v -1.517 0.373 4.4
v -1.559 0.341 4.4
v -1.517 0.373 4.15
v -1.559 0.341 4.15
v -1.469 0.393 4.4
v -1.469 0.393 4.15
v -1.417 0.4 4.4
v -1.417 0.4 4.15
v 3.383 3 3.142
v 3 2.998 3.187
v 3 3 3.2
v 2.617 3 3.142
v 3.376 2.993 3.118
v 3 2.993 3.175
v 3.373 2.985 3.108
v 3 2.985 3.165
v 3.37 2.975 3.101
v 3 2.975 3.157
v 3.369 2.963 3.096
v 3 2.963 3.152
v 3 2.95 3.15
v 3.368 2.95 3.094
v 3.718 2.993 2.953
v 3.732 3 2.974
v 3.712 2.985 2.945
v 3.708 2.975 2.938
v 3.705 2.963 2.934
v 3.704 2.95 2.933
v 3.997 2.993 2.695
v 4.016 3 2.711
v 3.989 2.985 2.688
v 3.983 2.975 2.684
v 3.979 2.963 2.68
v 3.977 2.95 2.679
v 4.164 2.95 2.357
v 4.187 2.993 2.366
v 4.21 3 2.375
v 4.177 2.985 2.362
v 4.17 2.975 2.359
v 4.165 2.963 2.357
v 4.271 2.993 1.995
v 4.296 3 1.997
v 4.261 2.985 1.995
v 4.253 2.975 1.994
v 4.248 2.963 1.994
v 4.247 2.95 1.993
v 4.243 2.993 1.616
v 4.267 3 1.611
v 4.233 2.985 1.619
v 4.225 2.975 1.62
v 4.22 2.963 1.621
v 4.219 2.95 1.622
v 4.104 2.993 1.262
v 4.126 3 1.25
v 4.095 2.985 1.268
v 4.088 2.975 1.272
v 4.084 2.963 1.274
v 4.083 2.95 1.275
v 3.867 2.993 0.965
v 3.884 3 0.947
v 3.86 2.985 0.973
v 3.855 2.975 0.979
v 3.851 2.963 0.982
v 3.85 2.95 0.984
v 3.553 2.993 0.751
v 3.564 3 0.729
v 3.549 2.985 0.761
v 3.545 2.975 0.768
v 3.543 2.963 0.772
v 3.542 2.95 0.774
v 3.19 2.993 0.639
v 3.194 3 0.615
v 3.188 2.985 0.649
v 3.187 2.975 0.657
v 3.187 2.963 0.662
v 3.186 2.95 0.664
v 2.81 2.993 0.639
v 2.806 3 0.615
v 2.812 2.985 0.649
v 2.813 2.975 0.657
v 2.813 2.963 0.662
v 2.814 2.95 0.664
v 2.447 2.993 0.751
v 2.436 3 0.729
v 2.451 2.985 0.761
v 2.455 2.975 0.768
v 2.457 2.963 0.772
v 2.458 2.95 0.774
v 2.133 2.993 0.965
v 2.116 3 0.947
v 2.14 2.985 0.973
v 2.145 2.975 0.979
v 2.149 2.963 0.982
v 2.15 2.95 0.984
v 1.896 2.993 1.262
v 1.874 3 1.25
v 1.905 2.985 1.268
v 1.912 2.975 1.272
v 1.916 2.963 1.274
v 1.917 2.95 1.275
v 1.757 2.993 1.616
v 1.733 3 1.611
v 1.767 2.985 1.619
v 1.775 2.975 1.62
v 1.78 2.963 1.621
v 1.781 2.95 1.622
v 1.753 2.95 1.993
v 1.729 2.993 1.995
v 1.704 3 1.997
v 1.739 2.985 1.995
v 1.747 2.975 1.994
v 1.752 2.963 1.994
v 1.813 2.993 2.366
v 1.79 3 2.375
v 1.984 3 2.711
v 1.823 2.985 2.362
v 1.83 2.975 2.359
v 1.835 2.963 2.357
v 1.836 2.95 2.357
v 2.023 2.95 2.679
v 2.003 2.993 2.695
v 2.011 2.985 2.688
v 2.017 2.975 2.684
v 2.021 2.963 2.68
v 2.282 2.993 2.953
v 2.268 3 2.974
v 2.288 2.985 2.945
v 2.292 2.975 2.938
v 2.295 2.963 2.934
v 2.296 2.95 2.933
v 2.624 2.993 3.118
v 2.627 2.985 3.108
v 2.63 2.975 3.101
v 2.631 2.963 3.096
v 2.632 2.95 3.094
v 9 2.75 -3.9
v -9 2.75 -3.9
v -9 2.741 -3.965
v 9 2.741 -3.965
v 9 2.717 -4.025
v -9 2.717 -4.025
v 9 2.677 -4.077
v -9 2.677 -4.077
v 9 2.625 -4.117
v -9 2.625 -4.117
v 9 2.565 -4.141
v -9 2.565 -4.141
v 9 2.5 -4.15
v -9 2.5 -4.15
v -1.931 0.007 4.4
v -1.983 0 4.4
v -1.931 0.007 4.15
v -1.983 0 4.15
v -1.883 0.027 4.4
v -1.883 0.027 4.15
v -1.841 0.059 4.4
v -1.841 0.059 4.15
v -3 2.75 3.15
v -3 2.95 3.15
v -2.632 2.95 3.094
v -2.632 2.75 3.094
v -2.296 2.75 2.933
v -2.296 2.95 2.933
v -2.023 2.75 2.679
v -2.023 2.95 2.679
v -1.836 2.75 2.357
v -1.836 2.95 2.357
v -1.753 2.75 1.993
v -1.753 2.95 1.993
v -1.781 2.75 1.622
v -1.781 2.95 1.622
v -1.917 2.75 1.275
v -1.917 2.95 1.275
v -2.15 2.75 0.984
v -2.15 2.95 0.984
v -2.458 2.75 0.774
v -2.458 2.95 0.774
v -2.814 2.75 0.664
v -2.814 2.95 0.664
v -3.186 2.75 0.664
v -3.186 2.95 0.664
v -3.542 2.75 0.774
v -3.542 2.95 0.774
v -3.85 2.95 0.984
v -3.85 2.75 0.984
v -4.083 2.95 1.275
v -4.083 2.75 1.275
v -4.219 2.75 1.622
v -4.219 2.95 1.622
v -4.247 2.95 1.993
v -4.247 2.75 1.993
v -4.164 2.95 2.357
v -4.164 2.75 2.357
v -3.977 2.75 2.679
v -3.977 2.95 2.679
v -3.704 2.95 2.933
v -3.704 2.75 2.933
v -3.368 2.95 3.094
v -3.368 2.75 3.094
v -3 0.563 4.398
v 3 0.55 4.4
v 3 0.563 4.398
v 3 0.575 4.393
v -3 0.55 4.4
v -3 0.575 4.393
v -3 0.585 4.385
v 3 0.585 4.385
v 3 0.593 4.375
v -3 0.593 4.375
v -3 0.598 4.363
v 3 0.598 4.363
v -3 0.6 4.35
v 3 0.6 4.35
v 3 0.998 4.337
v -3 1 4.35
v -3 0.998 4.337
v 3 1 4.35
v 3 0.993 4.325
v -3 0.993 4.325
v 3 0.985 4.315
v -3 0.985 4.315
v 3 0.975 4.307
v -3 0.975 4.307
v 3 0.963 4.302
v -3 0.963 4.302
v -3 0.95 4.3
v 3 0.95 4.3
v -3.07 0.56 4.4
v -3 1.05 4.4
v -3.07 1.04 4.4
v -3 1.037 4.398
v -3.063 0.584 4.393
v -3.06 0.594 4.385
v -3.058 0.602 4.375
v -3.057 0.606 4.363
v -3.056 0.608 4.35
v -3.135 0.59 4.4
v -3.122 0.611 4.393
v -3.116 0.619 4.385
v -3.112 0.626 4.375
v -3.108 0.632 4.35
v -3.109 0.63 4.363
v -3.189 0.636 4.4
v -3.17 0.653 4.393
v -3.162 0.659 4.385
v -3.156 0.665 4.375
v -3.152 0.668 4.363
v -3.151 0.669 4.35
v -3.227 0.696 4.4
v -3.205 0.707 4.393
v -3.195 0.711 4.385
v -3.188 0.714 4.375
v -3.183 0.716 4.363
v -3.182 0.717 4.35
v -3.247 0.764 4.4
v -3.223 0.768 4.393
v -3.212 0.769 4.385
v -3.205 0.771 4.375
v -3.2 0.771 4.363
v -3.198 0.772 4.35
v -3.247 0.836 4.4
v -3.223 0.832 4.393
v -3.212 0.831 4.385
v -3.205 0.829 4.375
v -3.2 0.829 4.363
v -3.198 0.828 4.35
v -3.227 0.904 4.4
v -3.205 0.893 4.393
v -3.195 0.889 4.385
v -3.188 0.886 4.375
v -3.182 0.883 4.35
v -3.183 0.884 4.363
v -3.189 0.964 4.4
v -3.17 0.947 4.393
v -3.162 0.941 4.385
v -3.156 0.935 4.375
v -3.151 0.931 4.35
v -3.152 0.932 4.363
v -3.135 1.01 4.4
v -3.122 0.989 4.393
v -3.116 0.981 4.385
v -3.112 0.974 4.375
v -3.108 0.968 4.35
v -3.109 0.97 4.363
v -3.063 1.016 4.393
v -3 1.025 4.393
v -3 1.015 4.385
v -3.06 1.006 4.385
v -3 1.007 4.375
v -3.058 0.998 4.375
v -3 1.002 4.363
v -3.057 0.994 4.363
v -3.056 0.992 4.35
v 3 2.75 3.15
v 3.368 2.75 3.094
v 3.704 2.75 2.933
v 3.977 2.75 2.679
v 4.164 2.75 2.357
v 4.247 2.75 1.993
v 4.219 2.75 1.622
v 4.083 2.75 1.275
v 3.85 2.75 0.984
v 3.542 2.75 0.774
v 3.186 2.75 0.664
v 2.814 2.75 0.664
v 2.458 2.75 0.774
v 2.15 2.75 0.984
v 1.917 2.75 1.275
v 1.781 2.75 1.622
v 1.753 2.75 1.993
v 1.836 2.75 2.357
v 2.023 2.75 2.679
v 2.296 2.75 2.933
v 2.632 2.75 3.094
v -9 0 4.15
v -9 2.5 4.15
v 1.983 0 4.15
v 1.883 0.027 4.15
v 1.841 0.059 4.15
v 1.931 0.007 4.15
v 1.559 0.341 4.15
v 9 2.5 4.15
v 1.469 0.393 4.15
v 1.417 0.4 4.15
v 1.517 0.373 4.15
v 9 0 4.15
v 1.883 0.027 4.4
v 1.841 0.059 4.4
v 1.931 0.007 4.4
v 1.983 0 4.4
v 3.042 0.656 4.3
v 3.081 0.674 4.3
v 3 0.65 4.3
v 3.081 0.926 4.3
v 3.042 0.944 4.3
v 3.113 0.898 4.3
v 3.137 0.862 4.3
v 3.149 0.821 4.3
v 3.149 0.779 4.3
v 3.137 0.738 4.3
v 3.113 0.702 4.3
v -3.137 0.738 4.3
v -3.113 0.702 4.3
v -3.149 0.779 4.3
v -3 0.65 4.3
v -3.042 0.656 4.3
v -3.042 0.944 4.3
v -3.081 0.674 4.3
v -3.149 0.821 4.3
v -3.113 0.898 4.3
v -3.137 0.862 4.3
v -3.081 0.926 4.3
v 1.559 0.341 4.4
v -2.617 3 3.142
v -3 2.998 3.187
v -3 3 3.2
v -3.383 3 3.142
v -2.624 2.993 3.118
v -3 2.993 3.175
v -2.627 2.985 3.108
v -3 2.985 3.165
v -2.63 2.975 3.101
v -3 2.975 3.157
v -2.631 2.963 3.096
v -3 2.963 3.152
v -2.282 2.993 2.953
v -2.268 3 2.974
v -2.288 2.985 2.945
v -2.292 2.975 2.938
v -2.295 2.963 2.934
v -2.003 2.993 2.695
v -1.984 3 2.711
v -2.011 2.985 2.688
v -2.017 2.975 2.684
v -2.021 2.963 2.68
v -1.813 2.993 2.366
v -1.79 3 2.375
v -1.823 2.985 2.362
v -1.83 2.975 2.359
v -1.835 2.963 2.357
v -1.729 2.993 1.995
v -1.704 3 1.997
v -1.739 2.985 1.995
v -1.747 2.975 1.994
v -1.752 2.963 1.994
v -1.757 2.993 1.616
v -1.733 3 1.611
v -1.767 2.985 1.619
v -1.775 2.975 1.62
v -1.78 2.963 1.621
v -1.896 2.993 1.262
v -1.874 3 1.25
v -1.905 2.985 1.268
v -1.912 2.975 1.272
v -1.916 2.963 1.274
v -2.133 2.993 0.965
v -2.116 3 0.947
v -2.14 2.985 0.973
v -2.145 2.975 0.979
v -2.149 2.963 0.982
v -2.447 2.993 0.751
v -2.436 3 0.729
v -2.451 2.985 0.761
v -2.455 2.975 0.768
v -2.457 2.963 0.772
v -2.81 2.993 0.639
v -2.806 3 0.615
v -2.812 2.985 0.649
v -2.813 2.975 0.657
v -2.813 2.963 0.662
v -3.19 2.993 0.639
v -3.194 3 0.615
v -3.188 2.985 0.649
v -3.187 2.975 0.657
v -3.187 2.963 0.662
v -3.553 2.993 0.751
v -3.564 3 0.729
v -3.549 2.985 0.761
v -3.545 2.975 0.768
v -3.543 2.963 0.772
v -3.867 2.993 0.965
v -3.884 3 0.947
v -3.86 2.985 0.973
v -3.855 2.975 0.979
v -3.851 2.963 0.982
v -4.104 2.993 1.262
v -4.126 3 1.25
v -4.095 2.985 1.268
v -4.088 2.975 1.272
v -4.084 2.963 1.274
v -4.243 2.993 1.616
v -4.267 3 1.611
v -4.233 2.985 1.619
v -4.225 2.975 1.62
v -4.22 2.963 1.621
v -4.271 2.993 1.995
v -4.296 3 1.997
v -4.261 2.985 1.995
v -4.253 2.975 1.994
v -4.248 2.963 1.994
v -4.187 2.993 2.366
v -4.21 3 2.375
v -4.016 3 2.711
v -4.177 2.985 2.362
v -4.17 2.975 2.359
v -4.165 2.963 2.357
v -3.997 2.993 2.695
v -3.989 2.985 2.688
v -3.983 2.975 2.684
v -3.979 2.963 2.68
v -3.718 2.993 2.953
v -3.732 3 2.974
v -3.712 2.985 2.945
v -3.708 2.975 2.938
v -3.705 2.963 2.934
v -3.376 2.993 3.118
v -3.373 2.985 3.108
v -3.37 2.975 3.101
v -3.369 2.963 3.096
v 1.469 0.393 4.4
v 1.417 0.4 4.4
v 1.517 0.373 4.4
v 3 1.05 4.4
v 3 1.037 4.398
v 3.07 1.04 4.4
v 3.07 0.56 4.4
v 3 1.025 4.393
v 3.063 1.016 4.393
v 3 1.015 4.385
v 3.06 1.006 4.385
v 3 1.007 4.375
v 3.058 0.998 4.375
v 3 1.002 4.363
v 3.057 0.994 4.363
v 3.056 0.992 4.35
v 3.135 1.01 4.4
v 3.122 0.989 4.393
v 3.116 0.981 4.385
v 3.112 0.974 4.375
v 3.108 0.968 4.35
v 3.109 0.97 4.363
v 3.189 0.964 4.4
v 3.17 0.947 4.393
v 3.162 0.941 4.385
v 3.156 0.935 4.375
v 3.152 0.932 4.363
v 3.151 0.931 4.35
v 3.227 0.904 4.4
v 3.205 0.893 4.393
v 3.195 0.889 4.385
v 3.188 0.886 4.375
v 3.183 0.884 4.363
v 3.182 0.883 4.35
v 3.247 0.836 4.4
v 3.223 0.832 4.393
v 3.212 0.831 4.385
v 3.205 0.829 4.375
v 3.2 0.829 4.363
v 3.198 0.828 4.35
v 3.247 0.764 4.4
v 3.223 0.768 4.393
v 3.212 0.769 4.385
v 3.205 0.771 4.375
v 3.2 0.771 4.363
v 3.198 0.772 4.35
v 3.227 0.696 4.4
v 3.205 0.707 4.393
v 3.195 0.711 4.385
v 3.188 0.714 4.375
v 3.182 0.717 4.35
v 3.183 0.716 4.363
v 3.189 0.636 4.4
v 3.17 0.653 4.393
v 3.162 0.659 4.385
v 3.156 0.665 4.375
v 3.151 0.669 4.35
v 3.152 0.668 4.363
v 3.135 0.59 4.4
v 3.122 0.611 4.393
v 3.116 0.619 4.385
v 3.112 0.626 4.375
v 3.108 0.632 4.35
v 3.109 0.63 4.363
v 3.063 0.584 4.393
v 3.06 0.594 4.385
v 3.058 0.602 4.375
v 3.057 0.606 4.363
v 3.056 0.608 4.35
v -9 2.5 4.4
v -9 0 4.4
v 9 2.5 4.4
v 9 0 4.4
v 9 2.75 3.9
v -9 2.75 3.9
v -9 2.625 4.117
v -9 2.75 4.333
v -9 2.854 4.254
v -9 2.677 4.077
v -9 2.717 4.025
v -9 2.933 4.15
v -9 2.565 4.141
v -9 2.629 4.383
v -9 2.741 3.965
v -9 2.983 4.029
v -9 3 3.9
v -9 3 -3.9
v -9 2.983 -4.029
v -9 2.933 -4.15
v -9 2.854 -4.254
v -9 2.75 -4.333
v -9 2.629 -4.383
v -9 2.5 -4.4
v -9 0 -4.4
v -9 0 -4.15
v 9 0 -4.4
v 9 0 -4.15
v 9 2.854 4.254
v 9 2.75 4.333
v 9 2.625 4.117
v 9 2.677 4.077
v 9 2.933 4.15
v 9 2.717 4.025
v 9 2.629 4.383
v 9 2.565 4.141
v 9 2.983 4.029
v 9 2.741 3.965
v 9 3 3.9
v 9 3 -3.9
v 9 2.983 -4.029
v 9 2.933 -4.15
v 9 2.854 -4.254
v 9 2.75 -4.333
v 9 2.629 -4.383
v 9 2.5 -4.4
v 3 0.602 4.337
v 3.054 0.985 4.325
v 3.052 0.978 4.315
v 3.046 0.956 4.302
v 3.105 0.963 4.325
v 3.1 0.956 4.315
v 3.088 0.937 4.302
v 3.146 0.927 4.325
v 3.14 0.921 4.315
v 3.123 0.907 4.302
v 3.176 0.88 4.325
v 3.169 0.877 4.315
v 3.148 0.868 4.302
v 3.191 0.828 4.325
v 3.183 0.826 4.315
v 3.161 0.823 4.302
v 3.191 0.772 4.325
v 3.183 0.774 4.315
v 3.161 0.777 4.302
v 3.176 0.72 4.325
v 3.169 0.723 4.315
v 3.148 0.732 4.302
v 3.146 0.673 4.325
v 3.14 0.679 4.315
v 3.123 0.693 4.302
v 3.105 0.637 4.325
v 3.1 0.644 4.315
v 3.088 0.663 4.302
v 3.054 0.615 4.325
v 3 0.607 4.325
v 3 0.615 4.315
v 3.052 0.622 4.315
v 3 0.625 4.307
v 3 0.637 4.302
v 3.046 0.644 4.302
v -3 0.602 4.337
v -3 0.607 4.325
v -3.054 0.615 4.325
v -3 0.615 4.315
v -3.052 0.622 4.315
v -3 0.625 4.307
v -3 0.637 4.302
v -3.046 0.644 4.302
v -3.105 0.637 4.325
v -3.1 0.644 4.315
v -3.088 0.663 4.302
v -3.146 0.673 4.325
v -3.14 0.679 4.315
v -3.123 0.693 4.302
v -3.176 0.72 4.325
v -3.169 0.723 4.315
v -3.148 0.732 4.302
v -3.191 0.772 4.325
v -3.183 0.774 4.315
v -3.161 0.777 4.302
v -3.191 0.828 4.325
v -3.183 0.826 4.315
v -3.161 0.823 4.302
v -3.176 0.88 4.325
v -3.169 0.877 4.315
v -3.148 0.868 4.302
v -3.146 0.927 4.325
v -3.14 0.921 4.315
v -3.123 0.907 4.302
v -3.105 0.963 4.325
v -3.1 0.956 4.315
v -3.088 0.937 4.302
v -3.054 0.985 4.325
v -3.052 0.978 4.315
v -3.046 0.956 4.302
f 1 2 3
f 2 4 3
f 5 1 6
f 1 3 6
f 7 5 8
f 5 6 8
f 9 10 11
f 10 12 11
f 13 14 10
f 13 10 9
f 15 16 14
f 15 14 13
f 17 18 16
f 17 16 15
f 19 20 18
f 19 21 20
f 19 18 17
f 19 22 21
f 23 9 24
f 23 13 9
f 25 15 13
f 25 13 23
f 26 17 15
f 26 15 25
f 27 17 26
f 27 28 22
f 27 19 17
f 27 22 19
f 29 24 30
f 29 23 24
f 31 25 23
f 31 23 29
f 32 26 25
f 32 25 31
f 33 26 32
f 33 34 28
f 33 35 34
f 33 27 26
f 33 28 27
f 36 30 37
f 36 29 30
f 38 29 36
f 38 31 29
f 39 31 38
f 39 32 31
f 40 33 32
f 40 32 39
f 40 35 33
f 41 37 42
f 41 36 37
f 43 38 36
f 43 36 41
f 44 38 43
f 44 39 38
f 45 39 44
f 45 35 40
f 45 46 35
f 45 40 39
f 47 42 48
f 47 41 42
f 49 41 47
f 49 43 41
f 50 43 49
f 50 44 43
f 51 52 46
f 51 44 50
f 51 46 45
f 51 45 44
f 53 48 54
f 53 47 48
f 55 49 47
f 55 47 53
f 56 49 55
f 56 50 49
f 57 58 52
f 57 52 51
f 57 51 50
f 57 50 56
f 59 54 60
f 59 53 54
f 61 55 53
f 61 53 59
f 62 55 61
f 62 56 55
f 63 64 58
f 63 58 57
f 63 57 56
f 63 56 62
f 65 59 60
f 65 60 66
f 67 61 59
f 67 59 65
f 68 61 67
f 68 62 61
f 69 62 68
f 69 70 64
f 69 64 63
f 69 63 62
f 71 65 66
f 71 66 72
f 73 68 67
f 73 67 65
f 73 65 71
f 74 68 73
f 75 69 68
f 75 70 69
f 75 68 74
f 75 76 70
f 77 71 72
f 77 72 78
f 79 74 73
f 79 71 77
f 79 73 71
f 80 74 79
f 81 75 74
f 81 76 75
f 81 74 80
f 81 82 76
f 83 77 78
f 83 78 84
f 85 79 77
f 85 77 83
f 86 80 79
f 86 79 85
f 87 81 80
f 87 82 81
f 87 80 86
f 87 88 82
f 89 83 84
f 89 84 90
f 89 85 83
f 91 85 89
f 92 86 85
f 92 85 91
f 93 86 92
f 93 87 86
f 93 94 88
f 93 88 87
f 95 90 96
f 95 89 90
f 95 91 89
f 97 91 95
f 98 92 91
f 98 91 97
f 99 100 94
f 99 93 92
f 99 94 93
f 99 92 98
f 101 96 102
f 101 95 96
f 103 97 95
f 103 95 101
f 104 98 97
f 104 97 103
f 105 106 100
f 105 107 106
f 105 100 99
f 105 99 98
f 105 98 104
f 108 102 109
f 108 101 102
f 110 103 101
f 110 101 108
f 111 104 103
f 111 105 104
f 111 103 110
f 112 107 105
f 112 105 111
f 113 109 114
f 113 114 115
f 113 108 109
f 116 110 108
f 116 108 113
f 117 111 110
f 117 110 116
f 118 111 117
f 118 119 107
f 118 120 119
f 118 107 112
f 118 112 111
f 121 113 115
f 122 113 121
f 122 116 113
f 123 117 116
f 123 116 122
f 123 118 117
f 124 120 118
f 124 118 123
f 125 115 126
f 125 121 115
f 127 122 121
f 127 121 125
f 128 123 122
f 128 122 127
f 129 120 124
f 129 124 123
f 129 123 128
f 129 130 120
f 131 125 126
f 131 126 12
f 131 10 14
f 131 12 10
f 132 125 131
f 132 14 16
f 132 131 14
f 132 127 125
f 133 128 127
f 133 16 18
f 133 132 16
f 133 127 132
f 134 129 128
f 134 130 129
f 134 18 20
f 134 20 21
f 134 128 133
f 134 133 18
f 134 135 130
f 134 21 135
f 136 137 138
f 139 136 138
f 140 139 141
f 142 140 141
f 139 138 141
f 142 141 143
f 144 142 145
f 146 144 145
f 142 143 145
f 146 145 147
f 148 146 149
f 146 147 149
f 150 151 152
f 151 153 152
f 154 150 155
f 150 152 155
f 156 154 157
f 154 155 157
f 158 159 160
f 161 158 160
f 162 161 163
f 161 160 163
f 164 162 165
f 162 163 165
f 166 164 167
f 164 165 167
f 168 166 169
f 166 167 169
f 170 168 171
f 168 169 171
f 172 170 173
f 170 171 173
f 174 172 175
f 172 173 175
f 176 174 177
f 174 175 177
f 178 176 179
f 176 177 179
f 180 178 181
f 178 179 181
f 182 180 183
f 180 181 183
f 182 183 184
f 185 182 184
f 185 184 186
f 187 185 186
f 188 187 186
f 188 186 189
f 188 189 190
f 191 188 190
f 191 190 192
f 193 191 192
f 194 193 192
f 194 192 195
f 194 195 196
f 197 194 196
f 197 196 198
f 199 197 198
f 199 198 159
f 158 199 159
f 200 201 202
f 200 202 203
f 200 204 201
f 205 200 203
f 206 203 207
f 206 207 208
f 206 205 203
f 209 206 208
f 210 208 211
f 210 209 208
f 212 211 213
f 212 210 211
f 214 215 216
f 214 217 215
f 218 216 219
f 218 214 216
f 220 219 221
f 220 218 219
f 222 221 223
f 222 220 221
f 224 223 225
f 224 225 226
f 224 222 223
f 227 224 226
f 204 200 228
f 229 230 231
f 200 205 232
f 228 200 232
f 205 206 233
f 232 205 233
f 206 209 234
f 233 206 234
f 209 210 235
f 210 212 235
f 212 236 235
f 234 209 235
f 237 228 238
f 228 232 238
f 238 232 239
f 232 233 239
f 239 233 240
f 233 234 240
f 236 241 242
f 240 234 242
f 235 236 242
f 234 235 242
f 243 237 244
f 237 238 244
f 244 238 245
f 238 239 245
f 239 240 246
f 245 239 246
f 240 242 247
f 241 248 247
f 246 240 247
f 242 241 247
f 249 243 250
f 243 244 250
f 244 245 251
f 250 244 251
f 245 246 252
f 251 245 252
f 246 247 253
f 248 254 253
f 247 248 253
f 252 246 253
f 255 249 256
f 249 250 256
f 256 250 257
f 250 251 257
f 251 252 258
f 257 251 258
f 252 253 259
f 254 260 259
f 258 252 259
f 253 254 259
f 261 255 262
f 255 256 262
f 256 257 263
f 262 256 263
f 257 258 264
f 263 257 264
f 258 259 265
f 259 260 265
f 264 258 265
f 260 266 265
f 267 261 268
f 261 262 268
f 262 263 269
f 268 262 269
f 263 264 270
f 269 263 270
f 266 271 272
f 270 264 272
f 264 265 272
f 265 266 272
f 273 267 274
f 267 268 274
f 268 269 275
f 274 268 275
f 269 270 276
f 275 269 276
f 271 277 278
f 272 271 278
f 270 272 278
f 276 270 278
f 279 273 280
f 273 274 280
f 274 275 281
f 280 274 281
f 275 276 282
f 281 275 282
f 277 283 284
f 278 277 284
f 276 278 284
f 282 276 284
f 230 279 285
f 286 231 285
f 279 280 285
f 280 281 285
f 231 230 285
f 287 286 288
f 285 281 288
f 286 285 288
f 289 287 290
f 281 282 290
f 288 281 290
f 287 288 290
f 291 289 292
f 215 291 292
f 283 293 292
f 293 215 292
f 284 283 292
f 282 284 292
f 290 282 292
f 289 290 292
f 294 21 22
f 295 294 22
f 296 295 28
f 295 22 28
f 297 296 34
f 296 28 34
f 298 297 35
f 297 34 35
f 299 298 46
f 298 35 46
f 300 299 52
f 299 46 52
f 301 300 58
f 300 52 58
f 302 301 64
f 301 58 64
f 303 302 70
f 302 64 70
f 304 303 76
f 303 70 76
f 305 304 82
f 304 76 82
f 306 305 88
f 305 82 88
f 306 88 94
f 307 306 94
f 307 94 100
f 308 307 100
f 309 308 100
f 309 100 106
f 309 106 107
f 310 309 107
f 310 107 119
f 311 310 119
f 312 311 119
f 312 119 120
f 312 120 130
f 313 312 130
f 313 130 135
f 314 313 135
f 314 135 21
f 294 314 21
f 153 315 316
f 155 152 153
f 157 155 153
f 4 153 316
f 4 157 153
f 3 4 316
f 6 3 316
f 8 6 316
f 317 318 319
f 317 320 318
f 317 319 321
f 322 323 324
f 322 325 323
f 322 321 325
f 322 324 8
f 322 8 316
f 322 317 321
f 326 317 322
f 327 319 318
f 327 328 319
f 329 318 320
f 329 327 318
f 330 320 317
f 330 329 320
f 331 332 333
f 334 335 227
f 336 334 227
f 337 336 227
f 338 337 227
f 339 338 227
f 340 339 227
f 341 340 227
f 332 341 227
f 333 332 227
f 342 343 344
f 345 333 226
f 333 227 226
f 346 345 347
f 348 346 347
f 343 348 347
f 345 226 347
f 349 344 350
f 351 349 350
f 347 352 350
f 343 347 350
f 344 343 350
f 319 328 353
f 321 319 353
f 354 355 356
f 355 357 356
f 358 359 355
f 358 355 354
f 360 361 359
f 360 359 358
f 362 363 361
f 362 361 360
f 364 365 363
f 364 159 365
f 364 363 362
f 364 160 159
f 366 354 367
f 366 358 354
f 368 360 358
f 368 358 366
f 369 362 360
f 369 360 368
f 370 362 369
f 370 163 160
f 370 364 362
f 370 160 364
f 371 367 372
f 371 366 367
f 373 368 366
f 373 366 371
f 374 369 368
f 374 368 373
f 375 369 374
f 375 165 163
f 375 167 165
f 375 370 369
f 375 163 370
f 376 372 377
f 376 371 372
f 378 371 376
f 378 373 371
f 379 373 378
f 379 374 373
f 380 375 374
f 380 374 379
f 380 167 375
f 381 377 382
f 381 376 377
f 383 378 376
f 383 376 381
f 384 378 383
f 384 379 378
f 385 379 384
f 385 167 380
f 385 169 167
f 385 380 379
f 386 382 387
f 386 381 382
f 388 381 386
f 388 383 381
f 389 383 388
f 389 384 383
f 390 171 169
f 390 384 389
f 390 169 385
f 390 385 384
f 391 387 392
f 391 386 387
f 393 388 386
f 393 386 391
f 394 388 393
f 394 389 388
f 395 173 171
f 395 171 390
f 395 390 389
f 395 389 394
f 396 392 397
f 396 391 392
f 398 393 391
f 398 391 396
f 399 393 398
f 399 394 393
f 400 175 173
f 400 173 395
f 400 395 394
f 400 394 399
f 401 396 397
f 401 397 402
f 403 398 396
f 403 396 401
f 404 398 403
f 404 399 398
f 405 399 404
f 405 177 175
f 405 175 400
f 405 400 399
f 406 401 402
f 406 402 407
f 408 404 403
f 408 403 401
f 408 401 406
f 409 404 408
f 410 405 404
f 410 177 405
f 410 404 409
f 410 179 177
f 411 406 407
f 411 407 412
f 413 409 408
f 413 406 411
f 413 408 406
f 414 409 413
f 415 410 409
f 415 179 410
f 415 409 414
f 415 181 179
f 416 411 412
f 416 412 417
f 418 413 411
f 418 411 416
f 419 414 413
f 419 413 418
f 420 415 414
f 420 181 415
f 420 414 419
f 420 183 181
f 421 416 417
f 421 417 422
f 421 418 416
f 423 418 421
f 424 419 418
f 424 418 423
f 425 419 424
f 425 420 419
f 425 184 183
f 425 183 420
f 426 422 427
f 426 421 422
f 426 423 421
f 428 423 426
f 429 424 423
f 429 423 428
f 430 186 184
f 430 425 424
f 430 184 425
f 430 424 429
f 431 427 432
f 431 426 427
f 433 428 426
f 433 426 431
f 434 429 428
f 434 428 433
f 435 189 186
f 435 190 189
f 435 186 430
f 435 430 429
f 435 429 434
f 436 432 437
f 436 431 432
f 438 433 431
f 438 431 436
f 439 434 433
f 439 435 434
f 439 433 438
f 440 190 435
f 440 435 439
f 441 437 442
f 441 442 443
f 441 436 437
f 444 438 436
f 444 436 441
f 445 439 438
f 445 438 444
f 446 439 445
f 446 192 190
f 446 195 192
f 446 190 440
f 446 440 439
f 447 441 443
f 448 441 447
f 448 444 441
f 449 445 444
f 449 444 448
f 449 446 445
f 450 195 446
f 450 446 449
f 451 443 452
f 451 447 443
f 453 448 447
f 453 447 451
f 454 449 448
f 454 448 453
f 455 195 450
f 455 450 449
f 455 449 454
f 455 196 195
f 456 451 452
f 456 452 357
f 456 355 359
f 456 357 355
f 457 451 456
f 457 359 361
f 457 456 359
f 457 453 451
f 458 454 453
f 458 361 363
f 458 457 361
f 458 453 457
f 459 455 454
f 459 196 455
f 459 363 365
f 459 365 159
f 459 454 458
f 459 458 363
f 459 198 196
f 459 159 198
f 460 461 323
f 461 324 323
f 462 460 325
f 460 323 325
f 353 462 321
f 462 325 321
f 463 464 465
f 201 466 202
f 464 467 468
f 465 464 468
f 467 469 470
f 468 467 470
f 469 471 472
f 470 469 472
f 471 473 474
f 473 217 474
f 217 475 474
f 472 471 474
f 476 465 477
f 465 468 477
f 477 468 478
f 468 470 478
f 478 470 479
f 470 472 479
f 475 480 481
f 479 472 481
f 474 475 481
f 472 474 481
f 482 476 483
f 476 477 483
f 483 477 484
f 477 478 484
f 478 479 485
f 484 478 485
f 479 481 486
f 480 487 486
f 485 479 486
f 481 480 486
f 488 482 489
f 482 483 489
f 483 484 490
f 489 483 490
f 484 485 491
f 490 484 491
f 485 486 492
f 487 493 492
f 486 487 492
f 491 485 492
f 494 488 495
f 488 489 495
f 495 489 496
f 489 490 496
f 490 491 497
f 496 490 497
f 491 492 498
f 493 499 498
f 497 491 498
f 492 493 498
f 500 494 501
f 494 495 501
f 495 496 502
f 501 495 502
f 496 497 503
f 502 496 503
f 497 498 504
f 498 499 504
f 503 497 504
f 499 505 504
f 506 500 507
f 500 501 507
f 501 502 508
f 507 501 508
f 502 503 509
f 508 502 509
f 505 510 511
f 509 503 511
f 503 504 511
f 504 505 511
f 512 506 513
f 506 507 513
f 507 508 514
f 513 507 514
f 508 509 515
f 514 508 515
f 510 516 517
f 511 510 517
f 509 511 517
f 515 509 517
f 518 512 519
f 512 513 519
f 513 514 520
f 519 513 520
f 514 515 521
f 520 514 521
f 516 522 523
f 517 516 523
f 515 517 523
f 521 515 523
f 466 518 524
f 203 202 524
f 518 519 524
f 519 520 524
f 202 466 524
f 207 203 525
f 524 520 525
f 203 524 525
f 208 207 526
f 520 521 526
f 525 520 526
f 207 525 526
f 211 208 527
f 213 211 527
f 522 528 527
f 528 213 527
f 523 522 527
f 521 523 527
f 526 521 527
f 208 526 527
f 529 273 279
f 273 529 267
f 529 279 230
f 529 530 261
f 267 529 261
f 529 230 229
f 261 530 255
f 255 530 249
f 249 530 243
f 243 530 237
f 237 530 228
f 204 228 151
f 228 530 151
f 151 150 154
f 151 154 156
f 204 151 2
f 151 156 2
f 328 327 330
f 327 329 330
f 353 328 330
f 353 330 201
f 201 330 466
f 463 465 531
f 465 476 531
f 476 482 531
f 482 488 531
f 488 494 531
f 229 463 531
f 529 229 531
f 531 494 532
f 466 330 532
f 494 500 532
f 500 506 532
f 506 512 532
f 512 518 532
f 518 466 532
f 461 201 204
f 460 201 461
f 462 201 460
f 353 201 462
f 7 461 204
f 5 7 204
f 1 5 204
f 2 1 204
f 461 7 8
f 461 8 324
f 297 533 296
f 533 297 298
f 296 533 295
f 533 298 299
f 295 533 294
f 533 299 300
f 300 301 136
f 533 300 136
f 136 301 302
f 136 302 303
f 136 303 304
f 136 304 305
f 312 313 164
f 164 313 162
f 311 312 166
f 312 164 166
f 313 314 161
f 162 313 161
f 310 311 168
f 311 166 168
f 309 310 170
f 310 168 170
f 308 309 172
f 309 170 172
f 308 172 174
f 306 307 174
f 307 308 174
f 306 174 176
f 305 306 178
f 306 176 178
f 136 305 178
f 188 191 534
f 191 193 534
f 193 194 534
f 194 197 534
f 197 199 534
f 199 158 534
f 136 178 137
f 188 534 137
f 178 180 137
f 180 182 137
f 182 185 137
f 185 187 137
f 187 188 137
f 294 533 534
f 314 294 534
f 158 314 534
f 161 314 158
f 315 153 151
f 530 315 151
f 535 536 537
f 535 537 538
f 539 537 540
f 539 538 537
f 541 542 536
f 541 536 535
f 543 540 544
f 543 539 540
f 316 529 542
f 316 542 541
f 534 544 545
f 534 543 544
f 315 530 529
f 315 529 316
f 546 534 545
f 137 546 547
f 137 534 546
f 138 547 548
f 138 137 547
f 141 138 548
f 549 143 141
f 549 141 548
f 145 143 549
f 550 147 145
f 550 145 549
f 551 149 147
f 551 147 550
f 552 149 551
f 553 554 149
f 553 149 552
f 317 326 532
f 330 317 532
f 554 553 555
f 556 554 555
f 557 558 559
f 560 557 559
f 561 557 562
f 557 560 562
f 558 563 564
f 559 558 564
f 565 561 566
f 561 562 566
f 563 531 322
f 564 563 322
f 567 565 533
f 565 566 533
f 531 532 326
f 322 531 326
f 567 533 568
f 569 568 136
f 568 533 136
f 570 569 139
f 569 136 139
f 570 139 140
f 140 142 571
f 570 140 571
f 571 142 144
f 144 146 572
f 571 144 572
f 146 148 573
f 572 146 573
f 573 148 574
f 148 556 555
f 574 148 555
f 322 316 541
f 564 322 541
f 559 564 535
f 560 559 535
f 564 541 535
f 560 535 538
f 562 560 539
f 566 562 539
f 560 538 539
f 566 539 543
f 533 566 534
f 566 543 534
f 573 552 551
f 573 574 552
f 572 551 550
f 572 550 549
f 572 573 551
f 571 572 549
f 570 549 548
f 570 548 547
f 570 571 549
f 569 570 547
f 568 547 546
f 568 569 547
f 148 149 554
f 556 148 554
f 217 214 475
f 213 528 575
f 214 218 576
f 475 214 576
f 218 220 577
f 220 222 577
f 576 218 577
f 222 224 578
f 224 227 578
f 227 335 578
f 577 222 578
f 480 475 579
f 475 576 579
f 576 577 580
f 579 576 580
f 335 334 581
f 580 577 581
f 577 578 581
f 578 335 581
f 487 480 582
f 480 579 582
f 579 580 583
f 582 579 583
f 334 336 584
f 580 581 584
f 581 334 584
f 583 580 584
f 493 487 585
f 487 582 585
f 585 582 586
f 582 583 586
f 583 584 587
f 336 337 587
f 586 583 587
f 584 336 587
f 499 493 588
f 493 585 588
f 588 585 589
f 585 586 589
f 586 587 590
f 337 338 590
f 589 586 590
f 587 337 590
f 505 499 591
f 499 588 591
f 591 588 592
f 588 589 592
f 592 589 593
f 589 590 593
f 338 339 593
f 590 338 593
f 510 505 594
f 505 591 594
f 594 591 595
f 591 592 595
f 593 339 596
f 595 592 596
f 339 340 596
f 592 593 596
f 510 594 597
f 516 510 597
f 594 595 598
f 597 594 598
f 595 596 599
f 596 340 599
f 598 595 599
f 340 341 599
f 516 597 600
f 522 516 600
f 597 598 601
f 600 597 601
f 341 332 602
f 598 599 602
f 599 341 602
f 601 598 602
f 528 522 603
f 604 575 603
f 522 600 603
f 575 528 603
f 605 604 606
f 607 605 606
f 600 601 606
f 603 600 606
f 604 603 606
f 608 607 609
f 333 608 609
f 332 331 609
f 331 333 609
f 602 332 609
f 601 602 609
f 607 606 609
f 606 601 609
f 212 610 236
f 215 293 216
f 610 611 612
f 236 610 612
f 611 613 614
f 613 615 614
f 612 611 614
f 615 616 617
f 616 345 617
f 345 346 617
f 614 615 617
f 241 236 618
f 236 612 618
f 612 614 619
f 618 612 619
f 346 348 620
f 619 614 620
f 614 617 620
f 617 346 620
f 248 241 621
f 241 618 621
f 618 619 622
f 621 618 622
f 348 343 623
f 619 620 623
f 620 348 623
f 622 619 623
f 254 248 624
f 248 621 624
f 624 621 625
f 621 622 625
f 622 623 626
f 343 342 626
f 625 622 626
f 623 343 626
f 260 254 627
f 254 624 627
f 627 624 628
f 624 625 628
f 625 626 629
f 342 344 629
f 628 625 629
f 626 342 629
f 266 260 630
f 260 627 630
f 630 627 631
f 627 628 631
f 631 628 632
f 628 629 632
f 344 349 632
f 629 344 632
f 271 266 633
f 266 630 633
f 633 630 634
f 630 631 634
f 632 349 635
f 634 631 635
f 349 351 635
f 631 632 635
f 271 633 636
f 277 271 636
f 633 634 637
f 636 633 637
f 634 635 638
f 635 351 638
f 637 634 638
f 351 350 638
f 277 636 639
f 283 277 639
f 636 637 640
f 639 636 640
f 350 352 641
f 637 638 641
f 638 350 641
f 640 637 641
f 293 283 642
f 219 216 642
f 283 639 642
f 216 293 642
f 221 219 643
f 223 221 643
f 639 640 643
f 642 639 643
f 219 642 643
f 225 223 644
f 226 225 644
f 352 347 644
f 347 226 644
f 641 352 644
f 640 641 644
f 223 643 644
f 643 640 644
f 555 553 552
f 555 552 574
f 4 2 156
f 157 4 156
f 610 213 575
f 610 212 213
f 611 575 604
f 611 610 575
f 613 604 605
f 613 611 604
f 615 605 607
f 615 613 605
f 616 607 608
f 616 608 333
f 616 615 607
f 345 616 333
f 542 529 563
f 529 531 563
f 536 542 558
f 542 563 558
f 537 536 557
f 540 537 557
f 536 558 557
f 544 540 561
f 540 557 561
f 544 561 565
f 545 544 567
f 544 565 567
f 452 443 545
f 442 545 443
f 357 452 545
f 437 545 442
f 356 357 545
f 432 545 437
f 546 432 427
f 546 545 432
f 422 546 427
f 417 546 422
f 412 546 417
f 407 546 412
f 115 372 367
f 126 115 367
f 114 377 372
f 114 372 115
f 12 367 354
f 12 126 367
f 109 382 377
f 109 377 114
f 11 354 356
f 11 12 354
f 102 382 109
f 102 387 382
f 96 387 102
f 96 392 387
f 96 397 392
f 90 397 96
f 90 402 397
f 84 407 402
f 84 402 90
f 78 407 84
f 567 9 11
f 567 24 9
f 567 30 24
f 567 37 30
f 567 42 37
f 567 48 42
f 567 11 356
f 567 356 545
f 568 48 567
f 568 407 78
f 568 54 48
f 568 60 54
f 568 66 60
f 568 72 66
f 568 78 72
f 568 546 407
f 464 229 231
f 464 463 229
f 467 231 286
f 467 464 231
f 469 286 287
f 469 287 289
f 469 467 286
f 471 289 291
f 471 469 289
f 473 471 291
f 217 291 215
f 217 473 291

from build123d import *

# Parameters (mm, degrees)
SKETCH1_W           = 18
SKETCH1_H           = 8.8
BOSS_EXTRUDE1_DEPTH = 3
SKETCH2_R           = 1.25
CUT_EXTRUDE1_DEPTH  = 3
FILLET1_R           = 0.5
CUT_EXTRUDE2_DEPTH  = 23
SKETCH4_W           = 4
SKETCH4_H           = 1.424515237
CUT_EXTRUDE3_DEPTH  = 2
CHAMFER1_SIZE       = 0.5
CUT_EXTRUDE4_DEPTH  = 0.1
FILLET2_R           = 0.05
FILLET3_R           = 0.2
FILLET4_R           = 0.05


# Some blends are built 0.0001 mm under size
with BuildPart() as part:
    # Sketch1 → Boss-Extrude1 (new body)
    with BuildSketch(Plane(origin=(0, 0, 0), x_dir=(1, 0, 0), z_dir=(0, 1, 0))):
        Rectangle(SKETCH1_W, SKETCH1_H)
    extrude(amount=BOSS_EXTRUDE1_DEPTH)

    # Sketch2 → Cut-Extrude1 (cut)
    with BuildSketch(Plane(origin=(0, 3, 0), x_dir=(1, 0, 0), z_dir=(0, 1, 0))):
        with Locations(Location((-3, -1.9, 0), (0, 0, 270))):
            Circle(SKETCH2_R)
        with Locations(Location((3, -1.9, 0), (0, 0, 270))):
            Circle(SKETCH2_R)
    extrude(amount=-CUT_EXTRUDE1_DEPTH, mode=Mode.SUBTRACT)

    # Fillet1
    fillet1_edges = [part.edges().sort_by_distance(p)[0] for p in [
        (0, 3, -4.4),
        (0, 3, 4.4),
    ]]
    fillet(fillet1_edges, radius=FILLET1_R)

    # Sketch3 → Cut-Extrude2 (cut)
    with BuildSketch(Plane.ZY.offset(9)):
        with BuildLine():
            Line((-4.15, 0.25), (-4.15, -7.258391717))
            Line((-4.15, -7.258391717), (4.15, -7.258391717))
            Line((4.15, -7.258391717), (4.15, 0.25))
            Line((4.15, 0.25), (4.15, 2.5))
            ThreePointArc((4.15, 2.5), (4.076776695, 2.676776695), (3.9, 2.75))
            Line((3.9, 2.75), (-3.9, 2.75))
            ThreePointArc((-3.9, 2.75), (-4.076776695, 2.676776695), (-4.15, 2.5))
            Line((-4.15, 2.5), (-4.15, 0.25))
        make_face()
    extrude(amount=-CUT_EXTRUDE2_DEPTH, mode=Mode.SUBTRACT)

    # Sketch4 → Cut-Extrude3 (cut)
    with BuildSketch(Plane.XY.offset(4.4)):
        with Locations((0, -0.312257619)):
            Rectangle(SKETCH4_W, SKETCH4_H)
    extrude(amount=-CUT_EXTRUDE3_DEPTH, mode=Mode.SUBTRACT)

    # Chamfer1
    # the kernel refuses this chamfer: 0.5 mm, written as the material it adds along each edge
    with BuildSketch(Plane(origin=(2, 0.4, 4.4), x_dir=(0.027495876610586487, -0.9996219169112968, 0), z_dir=(0, 0, -1))) as chamfer1_piece_1_section:
        Polygon((CHAMFER1_SIZE * 0.999621916911, CHAMFER1_SIZE * 0.0274958766106), (-CHAMFER1_SIZE * 0.0274958766106, CHAMFER1_SIZE * 0.999621916911), (0, 0), align=None)
    chamfer1_piece_1 = extrude(amount=0.25, mode=Mode.PRIVATE)
    chamfer1_piece_1 = split(chamfer1_piece_1, bisect_by=Plane(origin=(1.827140794, 0, 4.275), z_dir=(0, 1, 0)), keep=Keep.TOP, mode=Mode.PRIVATE)
    add(chamfer1_piece_1)
    with BuildSketch(Plane(origin=(-2, 0.4, 4.4), x_dir=(0.9996219169112968, 0.02749587661058639, 0), z_dir=(0, 0, -1))) as chamfer1_piece_2_section:
        Polygon((CHAMFER1_SIZE * 0.999621916911, CHAMFER1_SIZE * 0.0274958766106), (-CHAMFER1_SIZE * 0.0274958766106, CHAMFER1_SIZE * 0.999621916911), (0, 0), align=None)
    chamfer1_piece_2 = extrude(amount=0.25, mode=Mode.PRIVATE)
    chamfer1_piece_2 = split(chamfer1_piece_2, bisect_by=Plane(origin=(-1.827140794, 0, 4.275), z_dir=(0, 1, 0)), keep=Keep.TOP, mode=Mode.PRIVATE)
    add(chamfer1_piece_2)

    # Sketch5 → Cut-Extrude4 (cut)
    with BuildSketch(Plane.XY.offset(4.4)):
        with BuildLine():
            Line((-3, 1), (3, 1))
            ThreePointArc((3, 1), (3.2, 0.8), (3, 0.6))
            Line((3, 0.6), (-3, 0.6))
            ThreePointArc((-3, 0.6), (-3.2, 0.8), (-3, 1))
        make_face()
    extrude(amount=-CUT_EXTRUDE4_DEPTH, mode=Mode.SUBTRACT)

    # Fillet2
    fillet2_edges = [part.edges().sort_by_distance(p)[0] for p in [
        (3.2, 0.8, 4.4),
        (0, 0.6, 4.4),
        (-3.2, 0.8, 4.4),
        (0, 1, 4.3),
        (3.2, 0.8, 4.3),
        (0, 0.6, 4.3),
        (-3.2, 0.8, 4.3),
        (0, 1, 4.4),
    ]]
    fillet(fillet2_edges, radius=FILLET2_R - 0.0001)  # a hair under: the kernel refuses the full size

    # Fillet3
    fillet3_edges = [part.edges().sort_by_distance(p)[0] for p in [
        (-1.5, 0.4, 4.275),
        (1.5, 0.4, 4.275),
        (1.9, 0, 4.275),
        (-1.9, 0, 4.275),
    ]]
    fillet(fillet3_edges, radius=FILLET3_R)

    # Fillet4
    fillet4_edges = [part.edges().sort_by_distance(p)[0] for p in [
        (-3, 3, 0.65),
        (3, 3, 0.65),
    ]]
    fillet(fillet4_edges, radius=FILLET4_R)


solid = part.part
